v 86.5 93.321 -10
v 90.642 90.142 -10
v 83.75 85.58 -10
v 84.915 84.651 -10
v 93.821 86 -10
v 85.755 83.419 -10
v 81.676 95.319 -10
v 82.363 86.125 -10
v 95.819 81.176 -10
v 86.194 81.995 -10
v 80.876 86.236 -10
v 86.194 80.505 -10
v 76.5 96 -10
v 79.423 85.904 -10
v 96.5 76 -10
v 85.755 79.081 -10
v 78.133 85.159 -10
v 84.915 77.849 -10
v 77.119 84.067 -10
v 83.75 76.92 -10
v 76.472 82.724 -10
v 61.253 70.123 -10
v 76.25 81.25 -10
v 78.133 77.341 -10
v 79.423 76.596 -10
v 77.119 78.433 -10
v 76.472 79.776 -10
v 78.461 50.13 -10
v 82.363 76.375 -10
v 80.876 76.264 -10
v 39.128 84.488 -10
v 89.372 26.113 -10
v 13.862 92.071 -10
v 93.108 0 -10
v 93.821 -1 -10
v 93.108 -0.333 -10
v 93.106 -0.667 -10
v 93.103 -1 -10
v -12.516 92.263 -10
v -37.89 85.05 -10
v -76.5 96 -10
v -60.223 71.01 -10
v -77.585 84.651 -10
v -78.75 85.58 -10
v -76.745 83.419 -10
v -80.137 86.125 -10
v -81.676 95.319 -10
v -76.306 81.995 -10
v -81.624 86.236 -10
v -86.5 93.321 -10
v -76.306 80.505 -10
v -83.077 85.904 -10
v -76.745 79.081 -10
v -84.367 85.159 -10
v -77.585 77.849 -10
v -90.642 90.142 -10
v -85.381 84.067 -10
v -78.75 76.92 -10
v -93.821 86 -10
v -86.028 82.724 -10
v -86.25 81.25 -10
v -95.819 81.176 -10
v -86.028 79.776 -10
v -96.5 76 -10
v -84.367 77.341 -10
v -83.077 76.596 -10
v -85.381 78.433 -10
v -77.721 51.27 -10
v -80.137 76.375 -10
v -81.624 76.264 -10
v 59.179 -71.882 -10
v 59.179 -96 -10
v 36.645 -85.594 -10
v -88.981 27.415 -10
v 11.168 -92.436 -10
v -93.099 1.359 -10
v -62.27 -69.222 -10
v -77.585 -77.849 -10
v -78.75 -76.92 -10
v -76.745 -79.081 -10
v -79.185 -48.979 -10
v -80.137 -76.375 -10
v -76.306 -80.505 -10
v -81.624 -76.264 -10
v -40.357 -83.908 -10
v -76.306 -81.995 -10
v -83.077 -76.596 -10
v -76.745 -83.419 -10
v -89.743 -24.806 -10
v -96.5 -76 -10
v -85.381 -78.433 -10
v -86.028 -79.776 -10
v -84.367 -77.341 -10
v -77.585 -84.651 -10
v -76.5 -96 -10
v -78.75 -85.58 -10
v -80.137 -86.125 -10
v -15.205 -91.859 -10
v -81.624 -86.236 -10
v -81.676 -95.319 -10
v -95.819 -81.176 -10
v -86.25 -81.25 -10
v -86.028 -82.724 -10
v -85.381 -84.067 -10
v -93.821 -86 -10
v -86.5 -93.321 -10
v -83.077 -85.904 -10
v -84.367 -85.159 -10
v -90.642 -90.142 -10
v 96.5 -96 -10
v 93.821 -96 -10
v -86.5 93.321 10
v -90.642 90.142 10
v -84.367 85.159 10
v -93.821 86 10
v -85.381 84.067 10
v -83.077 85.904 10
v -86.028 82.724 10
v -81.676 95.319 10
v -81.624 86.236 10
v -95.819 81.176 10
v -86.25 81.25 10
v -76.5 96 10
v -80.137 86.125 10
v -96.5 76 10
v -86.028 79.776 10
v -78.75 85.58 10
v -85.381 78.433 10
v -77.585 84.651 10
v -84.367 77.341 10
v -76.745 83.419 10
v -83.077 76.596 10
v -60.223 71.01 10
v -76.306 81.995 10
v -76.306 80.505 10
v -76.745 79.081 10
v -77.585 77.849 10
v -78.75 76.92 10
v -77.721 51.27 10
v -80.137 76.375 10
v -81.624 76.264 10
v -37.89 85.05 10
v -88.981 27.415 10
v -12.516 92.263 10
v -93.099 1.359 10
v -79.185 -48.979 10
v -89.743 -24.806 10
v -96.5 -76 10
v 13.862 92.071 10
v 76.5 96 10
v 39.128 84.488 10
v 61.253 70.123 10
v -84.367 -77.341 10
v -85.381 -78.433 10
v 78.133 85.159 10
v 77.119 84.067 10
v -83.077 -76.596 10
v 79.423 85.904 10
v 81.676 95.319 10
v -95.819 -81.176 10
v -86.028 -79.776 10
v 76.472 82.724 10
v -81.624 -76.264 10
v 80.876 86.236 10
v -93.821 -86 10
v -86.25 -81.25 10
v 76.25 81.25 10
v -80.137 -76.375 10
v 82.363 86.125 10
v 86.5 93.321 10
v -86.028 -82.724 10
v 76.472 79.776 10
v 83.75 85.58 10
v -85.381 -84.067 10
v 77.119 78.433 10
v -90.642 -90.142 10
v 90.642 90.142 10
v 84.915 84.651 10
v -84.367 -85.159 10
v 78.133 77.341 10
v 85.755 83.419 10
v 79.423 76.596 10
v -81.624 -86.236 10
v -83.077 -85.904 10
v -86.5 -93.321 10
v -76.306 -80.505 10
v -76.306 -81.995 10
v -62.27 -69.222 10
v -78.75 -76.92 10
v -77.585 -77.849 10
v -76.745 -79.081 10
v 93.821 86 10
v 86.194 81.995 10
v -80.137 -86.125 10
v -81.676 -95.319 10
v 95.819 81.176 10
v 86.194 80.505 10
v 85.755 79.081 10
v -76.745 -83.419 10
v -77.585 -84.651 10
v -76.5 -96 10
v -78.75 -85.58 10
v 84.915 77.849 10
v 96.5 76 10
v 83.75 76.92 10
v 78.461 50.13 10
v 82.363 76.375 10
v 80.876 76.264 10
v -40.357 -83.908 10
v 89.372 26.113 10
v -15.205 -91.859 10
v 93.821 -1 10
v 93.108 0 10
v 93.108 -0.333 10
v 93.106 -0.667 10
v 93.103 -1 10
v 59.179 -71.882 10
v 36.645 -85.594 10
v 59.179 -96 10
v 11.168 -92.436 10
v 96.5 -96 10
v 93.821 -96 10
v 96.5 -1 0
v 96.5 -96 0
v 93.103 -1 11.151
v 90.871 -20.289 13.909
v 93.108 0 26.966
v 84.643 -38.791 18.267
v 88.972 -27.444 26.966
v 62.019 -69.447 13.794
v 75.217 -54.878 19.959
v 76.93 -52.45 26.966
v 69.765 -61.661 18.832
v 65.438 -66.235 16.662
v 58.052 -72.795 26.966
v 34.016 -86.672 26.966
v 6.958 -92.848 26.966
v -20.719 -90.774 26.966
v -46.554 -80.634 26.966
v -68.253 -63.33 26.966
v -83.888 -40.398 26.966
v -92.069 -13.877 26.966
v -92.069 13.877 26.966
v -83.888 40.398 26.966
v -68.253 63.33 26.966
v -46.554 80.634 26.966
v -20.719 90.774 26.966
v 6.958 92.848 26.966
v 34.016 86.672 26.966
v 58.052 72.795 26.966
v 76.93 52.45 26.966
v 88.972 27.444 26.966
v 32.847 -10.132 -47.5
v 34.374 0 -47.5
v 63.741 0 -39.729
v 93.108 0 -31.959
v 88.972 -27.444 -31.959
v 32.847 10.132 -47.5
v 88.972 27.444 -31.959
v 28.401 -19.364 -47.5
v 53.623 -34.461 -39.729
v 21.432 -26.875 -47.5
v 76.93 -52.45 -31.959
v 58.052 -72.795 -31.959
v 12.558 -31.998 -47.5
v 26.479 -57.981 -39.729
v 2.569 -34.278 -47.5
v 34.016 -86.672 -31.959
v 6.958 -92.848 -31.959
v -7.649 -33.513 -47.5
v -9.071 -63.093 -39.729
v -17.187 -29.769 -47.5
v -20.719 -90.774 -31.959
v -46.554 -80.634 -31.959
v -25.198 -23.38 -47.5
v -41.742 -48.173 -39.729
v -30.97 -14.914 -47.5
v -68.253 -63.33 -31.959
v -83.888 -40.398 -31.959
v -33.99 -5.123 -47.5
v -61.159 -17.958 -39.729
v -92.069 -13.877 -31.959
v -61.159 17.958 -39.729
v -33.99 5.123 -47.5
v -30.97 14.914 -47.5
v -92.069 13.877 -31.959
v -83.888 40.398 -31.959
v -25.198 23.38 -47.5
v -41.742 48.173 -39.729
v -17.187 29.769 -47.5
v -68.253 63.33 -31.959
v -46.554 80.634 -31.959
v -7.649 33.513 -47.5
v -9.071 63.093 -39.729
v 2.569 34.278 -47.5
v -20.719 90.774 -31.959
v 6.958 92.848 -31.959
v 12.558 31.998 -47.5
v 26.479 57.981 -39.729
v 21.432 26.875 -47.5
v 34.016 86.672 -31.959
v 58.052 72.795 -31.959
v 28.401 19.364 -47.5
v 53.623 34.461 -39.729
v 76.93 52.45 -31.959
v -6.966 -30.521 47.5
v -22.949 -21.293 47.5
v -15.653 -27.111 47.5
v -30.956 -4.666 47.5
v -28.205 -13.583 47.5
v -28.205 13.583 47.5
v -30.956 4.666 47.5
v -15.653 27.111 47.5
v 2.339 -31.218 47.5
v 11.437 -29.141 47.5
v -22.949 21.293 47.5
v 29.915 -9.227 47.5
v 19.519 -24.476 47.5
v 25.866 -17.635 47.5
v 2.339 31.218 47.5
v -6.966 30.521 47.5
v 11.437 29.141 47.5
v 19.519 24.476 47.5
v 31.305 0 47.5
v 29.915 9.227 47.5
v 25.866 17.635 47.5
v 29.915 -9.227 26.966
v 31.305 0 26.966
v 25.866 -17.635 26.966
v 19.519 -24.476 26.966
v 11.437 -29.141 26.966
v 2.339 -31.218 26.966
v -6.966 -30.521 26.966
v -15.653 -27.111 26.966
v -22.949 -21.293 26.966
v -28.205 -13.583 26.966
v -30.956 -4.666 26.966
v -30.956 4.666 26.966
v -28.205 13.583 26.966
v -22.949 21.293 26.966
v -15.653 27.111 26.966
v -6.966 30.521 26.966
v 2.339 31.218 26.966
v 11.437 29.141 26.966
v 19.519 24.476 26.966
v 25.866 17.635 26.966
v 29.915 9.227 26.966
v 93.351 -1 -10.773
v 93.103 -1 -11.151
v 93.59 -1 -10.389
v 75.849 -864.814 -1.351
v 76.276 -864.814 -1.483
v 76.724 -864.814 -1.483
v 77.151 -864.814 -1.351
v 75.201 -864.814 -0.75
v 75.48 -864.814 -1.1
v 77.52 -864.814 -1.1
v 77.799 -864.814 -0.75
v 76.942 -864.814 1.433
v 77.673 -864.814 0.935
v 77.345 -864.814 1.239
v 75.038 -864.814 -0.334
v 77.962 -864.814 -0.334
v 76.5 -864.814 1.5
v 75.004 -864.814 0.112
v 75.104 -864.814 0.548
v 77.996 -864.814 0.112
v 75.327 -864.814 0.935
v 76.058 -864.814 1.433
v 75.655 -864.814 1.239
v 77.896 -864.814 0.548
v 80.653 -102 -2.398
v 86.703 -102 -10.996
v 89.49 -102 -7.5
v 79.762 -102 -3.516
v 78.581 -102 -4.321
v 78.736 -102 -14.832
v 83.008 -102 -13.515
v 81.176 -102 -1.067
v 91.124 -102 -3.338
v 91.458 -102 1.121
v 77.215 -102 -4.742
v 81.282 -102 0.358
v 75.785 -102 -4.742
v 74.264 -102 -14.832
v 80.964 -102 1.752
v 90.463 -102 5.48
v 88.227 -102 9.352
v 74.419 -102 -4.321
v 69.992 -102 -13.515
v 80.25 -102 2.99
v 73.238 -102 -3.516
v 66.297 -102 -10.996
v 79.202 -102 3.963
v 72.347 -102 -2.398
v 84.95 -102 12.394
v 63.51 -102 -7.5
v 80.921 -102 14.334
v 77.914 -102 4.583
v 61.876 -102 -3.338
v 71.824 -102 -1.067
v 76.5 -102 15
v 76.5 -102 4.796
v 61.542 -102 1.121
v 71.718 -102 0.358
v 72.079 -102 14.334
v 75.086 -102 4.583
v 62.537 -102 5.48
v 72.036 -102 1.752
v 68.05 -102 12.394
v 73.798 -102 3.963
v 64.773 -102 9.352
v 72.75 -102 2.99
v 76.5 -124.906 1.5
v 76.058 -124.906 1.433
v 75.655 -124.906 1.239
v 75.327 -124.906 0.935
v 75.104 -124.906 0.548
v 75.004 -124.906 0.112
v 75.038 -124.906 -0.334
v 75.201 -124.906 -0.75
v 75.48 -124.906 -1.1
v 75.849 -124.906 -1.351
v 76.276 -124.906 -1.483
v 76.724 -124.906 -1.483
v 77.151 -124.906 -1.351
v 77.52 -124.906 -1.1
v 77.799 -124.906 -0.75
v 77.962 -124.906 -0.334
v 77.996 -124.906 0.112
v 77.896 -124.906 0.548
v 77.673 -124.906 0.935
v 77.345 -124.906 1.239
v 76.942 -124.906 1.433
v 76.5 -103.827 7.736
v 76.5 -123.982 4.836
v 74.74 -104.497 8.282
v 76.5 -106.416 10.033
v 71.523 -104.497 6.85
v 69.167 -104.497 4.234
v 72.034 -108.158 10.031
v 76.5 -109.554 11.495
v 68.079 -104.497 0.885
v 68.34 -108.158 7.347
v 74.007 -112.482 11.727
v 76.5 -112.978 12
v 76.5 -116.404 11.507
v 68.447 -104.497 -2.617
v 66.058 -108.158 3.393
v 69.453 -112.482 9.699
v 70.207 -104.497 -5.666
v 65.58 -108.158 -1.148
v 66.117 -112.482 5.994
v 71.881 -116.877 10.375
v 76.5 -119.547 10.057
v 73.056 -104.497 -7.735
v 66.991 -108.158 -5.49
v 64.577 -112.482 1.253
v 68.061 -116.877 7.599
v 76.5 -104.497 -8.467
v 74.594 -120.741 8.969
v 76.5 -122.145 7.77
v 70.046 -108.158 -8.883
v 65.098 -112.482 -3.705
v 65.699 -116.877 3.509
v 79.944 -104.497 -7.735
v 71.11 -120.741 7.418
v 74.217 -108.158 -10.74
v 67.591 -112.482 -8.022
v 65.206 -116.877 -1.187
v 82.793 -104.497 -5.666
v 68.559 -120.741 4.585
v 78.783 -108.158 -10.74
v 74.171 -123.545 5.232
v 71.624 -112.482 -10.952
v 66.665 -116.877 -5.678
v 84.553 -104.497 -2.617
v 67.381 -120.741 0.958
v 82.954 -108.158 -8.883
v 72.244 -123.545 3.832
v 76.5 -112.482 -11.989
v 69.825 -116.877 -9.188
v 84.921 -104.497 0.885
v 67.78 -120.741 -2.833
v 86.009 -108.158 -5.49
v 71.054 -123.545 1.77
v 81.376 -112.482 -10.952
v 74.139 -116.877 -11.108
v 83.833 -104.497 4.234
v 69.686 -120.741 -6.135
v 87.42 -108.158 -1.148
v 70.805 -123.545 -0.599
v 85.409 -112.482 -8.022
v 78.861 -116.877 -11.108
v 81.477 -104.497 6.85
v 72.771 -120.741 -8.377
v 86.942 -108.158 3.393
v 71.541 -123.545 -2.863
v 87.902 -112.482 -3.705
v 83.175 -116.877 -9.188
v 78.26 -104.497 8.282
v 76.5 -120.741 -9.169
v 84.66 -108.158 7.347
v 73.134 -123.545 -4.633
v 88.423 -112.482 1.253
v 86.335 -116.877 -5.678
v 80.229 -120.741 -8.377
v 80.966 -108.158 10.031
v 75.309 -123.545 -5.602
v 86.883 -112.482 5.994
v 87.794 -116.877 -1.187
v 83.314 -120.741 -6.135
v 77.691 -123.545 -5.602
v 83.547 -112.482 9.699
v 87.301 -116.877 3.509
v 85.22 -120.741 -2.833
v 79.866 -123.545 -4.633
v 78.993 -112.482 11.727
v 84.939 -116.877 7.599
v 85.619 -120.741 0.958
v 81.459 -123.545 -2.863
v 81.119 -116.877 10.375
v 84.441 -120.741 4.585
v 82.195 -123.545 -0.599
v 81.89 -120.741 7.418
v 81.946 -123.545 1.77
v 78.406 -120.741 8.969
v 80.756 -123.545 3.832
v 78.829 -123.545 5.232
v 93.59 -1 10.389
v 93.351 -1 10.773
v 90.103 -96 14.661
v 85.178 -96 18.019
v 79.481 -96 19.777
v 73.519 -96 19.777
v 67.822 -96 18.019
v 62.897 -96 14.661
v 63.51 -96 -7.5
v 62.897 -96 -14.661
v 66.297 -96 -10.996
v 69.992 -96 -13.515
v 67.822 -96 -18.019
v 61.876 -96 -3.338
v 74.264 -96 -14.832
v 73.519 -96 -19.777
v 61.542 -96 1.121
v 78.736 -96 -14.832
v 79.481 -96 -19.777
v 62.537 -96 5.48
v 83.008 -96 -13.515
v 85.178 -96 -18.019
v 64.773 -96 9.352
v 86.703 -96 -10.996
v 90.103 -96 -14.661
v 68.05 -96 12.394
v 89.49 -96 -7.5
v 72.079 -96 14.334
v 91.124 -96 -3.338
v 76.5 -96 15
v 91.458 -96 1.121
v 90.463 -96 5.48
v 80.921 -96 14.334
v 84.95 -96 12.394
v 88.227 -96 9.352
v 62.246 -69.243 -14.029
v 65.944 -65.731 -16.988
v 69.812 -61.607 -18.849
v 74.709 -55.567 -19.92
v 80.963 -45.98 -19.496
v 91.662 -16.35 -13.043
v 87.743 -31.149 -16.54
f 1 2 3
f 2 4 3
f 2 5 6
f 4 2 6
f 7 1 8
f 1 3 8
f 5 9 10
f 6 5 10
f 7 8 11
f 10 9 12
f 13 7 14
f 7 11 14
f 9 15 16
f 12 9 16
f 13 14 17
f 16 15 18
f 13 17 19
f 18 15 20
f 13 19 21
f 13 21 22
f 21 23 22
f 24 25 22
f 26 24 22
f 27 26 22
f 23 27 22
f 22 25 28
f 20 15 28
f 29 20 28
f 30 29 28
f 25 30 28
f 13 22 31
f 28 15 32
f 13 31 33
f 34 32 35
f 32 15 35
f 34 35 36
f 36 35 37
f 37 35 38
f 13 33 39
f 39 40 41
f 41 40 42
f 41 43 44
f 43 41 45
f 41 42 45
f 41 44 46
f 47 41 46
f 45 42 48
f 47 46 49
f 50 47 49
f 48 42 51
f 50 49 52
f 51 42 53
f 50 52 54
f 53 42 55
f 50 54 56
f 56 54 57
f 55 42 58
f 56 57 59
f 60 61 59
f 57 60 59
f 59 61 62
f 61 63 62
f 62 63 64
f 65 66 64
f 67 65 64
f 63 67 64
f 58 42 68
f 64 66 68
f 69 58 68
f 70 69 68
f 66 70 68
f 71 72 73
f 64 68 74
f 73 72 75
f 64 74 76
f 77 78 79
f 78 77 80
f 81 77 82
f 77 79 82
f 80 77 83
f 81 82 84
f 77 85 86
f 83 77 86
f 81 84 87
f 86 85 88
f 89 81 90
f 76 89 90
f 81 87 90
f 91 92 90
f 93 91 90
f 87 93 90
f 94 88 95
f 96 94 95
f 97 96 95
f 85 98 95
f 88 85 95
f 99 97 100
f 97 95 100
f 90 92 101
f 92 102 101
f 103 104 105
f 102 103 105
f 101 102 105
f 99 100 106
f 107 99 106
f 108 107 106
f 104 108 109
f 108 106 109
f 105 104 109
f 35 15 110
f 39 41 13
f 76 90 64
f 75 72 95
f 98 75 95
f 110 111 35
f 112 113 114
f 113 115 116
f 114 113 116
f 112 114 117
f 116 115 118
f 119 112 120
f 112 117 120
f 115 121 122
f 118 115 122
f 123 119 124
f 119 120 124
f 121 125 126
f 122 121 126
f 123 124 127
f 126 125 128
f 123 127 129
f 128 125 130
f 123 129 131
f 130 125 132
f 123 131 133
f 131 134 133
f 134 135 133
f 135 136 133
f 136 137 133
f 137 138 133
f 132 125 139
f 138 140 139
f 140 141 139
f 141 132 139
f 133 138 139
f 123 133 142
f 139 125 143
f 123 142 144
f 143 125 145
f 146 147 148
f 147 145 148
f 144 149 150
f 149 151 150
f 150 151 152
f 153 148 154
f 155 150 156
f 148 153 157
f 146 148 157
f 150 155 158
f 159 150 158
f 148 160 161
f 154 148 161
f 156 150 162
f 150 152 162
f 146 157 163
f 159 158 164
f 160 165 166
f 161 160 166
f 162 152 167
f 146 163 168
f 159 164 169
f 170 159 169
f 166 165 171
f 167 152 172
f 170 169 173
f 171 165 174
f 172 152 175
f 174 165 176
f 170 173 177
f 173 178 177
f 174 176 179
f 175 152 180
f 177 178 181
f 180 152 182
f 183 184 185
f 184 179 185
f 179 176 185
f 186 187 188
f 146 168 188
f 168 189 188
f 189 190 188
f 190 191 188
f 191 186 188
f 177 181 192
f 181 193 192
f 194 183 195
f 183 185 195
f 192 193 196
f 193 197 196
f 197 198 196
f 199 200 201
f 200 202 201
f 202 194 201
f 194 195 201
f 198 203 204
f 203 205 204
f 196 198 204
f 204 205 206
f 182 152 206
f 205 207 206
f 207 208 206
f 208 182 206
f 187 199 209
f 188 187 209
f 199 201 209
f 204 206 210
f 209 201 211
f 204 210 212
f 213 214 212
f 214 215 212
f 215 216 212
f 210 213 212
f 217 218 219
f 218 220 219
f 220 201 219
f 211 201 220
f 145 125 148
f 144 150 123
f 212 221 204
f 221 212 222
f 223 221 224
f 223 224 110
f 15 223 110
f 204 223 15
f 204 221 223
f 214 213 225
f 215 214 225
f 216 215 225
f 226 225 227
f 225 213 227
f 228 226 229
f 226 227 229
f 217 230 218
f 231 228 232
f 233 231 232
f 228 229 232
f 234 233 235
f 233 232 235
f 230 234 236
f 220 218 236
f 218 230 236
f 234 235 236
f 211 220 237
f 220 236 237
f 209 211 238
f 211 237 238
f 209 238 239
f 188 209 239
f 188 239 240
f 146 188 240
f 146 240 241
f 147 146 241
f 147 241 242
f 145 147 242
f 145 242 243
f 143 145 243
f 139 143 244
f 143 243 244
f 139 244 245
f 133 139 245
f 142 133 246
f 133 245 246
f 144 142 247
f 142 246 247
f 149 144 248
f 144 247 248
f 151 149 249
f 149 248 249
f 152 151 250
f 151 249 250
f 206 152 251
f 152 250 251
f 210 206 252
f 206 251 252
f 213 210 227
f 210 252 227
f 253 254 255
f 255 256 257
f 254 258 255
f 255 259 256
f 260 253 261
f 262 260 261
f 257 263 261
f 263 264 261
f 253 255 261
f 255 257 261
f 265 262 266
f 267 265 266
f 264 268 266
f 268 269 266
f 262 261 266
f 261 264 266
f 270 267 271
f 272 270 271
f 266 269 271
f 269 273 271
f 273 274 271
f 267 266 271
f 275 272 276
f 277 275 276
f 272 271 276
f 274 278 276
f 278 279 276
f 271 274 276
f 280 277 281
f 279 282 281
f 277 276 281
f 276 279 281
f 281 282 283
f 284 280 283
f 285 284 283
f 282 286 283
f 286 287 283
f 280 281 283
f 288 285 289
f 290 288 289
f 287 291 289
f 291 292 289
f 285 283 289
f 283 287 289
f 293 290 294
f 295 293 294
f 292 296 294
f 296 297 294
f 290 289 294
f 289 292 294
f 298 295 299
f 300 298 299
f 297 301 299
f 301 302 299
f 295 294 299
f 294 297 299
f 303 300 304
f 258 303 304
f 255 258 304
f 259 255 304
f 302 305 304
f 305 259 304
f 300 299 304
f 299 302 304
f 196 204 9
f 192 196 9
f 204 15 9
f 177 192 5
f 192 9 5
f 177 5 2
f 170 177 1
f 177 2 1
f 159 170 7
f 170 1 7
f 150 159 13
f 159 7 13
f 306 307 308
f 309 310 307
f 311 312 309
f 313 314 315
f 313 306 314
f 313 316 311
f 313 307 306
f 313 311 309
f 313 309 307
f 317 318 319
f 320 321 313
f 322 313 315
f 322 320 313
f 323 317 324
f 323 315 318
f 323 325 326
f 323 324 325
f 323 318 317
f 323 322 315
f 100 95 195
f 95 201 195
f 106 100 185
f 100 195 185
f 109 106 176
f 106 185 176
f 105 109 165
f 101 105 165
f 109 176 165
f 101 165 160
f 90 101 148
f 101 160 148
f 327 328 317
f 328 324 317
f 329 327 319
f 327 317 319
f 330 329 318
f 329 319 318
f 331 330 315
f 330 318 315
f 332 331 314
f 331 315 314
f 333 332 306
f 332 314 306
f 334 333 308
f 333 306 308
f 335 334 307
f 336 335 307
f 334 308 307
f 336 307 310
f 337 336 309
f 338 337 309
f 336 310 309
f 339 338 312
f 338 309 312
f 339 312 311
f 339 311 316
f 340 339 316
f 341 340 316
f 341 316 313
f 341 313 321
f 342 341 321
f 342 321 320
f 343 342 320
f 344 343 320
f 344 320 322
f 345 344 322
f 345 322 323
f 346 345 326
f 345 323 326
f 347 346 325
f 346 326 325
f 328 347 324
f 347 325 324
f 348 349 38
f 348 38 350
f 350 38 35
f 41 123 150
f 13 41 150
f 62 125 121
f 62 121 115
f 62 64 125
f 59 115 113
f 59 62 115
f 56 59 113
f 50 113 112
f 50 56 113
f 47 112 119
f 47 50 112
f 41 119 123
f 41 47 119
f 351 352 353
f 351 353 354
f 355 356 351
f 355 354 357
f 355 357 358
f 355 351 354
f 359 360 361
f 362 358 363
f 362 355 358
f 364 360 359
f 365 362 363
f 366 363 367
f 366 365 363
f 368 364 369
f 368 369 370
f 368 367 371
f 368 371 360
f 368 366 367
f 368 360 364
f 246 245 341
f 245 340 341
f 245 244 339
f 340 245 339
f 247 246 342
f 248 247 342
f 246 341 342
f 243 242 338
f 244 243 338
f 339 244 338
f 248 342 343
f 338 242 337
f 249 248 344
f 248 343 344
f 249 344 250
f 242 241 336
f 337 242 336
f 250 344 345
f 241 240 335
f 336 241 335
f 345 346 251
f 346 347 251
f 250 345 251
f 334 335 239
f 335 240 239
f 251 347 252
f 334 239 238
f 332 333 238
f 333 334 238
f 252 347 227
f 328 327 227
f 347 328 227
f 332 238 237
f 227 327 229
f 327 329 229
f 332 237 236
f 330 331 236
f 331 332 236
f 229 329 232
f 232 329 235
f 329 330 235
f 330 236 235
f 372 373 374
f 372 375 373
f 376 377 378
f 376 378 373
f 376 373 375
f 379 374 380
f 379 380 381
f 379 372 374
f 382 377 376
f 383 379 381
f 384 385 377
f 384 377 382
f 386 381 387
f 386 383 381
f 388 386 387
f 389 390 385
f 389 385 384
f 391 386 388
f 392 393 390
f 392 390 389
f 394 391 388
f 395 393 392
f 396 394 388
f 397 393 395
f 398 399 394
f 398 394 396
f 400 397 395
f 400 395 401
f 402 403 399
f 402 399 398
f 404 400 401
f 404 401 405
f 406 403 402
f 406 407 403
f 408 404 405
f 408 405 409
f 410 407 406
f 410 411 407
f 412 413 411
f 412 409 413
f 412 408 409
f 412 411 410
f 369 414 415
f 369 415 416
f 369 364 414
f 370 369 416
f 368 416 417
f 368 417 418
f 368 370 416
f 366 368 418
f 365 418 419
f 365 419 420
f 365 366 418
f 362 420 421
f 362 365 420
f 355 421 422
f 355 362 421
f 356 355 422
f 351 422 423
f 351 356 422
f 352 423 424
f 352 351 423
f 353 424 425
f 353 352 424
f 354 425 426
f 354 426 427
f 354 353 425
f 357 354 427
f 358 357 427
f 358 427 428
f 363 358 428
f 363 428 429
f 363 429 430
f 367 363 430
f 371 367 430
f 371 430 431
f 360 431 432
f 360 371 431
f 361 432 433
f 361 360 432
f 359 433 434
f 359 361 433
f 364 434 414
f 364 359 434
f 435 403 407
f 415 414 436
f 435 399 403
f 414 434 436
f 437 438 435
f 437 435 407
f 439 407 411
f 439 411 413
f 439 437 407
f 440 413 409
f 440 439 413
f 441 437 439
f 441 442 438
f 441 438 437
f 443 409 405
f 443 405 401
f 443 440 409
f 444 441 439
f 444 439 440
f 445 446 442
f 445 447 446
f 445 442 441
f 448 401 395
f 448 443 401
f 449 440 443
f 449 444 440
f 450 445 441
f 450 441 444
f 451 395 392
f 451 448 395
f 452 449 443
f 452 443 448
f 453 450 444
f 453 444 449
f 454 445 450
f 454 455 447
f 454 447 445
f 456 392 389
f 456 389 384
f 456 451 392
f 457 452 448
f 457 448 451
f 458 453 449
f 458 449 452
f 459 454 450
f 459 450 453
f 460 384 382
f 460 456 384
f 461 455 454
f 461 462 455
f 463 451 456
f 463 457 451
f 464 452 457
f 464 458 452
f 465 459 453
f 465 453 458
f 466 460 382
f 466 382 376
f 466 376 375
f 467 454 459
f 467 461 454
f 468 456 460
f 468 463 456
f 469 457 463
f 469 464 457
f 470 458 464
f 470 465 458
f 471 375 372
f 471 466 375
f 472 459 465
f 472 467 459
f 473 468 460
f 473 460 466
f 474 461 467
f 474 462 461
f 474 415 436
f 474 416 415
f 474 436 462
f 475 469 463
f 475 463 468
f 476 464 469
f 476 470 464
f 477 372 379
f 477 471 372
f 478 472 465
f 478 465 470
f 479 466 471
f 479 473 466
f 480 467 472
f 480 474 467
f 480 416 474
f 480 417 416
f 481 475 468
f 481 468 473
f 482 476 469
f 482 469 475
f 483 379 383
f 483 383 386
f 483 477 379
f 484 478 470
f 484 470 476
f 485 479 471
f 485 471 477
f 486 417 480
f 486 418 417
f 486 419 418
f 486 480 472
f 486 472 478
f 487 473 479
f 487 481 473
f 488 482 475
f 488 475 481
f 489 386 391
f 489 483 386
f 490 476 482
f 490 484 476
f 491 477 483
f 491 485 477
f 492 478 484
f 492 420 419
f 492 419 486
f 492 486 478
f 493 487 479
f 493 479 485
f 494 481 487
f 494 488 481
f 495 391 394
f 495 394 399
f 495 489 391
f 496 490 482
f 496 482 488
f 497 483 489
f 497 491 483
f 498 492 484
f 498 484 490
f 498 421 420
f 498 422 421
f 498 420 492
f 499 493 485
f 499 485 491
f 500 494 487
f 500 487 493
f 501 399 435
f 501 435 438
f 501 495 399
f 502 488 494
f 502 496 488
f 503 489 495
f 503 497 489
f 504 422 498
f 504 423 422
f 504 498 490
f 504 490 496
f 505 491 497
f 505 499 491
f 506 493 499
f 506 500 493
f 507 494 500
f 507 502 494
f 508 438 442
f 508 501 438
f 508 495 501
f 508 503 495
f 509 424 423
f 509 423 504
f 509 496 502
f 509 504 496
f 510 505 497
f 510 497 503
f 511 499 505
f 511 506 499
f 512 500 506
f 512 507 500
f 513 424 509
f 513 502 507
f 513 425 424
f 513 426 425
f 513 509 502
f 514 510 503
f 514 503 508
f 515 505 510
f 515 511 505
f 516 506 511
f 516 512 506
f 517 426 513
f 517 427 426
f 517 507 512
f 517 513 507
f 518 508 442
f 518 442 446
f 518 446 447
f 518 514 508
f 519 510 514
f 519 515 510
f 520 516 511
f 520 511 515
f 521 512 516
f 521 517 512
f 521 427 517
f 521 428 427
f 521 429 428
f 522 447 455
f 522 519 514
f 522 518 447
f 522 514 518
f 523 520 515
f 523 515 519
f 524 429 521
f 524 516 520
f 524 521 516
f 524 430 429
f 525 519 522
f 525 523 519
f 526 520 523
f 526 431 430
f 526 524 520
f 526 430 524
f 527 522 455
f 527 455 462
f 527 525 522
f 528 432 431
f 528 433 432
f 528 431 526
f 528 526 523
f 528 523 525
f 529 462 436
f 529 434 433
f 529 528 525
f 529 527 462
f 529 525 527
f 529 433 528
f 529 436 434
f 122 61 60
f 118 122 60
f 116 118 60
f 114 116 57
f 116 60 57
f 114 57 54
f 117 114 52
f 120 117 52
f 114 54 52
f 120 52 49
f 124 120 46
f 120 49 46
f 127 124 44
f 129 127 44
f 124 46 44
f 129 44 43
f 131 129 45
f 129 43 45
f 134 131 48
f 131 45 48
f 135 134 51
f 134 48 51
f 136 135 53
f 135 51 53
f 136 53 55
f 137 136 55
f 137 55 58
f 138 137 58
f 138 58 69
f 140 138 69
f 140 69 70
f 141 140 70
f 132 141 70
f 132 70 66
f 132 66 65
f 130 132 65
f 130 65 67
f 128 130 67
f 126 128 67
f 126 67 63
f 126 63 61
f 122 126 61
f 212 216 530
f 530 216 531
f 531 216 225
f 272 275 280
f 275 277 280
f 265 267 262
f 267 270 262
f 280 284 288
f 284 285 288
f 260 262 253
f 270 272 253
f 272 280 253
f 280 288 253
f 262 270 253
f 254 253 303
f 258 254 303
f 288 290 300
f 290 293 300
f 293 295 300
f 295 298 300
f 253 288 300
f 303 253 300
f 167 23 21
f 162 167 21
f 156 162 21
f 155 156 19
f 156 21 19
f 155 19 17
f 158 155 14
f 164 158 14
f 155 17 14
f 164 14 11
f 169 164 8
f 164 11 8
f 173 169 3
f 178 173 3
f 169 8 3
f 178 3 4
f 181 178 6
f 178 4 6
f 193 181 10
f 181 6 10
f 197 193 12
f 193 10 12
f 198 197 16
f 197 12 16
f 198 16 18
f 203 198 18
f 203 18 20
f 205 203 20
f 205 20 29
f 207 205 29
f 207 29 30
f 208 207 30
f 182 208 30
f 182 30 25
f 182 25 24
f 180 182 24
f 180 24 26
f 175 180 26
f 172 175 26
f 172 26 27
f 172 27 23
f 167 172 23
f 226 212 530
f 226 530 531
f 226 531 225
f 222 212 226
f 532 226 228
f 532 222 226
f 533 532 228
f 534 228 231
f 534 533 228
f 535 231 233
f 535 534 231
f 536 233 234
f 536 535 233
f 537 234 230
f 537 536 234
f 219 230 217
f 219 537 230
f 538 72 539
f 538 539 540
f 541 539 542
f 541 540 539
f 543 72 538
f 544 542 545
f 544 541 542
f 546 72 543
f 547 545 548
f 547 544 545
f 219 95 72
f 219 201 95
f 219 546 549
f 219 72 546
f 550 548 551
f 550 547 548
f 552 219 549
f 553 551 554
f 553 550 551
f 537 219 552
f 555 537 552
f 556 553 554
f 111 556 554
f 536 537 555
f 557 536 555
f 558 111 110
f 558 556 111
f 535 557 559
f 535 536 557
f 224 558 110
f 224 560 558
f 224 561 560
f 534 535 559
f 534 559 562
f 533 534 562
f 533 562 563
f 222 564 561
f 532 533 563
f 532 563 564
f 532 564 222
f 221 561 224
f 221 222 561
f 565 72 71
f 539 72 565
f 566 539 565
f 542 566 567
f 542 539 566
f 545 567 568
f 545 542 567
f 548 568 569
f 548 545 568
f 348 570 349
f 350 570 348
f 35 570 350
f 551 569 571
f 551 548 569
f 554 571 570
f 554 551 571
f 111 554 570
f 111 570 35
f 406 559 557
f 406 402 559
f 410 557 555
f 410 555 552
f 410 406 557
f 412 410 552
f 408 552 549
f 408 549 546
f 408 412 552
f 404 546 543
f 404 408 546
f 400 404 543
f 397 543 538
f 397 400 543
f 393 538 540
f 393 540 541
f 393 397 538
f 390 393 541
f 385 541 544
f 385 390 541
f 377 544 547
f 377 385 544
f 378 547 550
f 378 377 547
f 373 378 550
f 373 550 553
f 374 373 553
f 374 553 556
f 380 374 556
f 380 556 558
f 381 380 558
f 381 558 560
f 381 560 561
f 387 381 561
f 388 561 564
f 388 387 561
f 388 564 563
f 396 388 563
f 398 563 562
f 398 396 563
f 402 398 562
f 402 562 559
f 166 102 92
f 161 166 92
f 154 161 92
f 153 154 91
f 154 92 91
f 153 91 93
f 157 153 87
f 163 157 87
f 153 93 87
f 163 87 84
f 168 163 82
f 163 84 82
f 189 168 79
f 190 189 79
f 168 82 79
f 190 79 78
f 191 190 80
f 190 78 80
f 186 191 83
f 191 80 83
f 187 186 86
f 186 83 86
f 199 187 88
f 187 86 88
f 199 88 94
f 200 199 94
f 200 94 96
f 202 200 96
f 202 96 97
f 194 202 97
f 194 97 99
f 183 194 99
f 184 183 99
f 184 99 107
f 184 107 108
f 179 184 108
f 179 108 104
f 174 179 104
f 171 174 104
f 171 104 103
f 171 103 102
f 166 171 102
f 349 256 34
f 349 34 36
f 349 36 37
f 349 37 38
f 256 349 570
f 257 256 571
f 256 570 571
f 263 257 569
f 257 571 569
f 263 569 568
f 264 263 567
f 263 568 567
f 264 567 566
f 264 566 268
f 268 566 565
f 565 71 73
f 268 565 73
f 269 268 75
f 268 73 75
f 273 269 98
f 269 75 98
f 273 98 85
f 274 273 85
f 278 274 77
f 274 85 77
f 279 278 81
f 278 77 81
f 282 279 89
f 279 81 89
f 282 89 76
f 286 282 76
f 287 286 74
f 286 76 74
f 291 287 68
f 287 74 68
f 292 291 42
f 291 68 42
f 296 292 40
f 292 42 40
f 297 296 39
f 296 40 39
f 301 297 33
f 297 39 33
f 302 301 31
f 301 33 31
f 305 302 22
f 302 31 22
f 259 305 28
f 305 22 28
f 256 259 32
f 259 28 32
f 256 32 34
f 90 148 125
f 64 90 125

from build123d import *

# Parameters (mm, degrees)
SZKIC1_W                    = 193
SZKIC1_H                    = 192
DODANIE_WYCI_GNI_CIE1_DEPTH = 47.5
OTW_R_10_0_10_1_D           = 10
SZKIC5_R                    = 20
DODANIE_WYCI_GNI_CIE2_DEPTH = 95
ZAOKR_GLENIE1_R             = 20


with BuildPart() as part:
    # Szkic1 → Dodanie-wyciągnięcie1 (new, symmetric)
    with BuildSketch(Plane.XY):
        Rectangle(SZKIC1_W, SZKIC1_H)
    extrude(amount=DODANIE_WYCI_GNI_CIE1_DEPTH, both=True)

    # Szkic2 → Wycięcie-obrót1 (revolve, cut)
    with BuildSketch(Plane(origin=(0, 0, 0), x_dir=(1, 0, 0), z_dir=(0, 1, 0))):
        Polygon((-93.108465818, -10), (-93.108465818, -26.965533902), (-31.305449461, -26.965533902), (-31.305449461, -47.5), (-96.5, -47.5), (-149.784754378, -47.5), (-149.784754378, -10), align=None)
        Polygon((-93.108465818, 10), (-149.784754378, 10), (-149.784754378, 64.69075005), (-34.374339346, 64.69075005), (-34.374339346, 47.5), (-93.108465818, 31.958776917), align=None)
    revolve(axis=Axis((0, 0, 0), (0, 0, -1)), mode=Mode.SUBTRACT)

    # Otwór Ø10.0 (10)1 (through all)
    with Locations(Plane.XY.offset(10)):
        with Locations((-81.25, 81.25), (81.25, 81.25), (-81.25, -81.25)):
            Hole(OTW_R_10_0_10_1_D / 2)

    # Szkic5 → Dodanie-wyciągnięcie2 (add)
    with BuildSketch(Plane.XZ.offset(96)):
        with Locations((76.5, 0)):
            Circle(SZKIC5_R)
    extrude(amount=-DODANIE_WYCI_GNI_CIE2_DEPTH)

    # Zaokrąglenie1
    zaokr_glenie1_edges = [part.edges().sort_by_distance(p)[0] for p in [
        (-96.5, -96, 0),
        (-96.5, 96, 0),
        (96.5, 96, 0),
    ]]
    fillet(zaokr_glenie1_edges, radius=ZAOKR_GLENIE1_R)

    # Szkic6 → Obrót1 (revolve)
    with BuildSketch(Plane.XY):
        with BuildLine():
            Line((76.5, -96), (91.5, -96))
            Line((91.5, -96), (91.5, -102))
            Line((91.5, -102), (81.295831523, -102))
            ThreePointArc((81.295831523, -102), (88.377677323, -114.709029376), (78, -124.9058809))
            Line((78, -124.9058809), (78, -864.813984477))
            Line((78, -864.813984477), (76.5, -864.813984477))
            Line((76.5, -864.813984477), (76.5, -96))
        make_face()
    revolve(axis=Axis((76.5, -95.828898057, 0), (0, -1, 0)))


solid = part.part
